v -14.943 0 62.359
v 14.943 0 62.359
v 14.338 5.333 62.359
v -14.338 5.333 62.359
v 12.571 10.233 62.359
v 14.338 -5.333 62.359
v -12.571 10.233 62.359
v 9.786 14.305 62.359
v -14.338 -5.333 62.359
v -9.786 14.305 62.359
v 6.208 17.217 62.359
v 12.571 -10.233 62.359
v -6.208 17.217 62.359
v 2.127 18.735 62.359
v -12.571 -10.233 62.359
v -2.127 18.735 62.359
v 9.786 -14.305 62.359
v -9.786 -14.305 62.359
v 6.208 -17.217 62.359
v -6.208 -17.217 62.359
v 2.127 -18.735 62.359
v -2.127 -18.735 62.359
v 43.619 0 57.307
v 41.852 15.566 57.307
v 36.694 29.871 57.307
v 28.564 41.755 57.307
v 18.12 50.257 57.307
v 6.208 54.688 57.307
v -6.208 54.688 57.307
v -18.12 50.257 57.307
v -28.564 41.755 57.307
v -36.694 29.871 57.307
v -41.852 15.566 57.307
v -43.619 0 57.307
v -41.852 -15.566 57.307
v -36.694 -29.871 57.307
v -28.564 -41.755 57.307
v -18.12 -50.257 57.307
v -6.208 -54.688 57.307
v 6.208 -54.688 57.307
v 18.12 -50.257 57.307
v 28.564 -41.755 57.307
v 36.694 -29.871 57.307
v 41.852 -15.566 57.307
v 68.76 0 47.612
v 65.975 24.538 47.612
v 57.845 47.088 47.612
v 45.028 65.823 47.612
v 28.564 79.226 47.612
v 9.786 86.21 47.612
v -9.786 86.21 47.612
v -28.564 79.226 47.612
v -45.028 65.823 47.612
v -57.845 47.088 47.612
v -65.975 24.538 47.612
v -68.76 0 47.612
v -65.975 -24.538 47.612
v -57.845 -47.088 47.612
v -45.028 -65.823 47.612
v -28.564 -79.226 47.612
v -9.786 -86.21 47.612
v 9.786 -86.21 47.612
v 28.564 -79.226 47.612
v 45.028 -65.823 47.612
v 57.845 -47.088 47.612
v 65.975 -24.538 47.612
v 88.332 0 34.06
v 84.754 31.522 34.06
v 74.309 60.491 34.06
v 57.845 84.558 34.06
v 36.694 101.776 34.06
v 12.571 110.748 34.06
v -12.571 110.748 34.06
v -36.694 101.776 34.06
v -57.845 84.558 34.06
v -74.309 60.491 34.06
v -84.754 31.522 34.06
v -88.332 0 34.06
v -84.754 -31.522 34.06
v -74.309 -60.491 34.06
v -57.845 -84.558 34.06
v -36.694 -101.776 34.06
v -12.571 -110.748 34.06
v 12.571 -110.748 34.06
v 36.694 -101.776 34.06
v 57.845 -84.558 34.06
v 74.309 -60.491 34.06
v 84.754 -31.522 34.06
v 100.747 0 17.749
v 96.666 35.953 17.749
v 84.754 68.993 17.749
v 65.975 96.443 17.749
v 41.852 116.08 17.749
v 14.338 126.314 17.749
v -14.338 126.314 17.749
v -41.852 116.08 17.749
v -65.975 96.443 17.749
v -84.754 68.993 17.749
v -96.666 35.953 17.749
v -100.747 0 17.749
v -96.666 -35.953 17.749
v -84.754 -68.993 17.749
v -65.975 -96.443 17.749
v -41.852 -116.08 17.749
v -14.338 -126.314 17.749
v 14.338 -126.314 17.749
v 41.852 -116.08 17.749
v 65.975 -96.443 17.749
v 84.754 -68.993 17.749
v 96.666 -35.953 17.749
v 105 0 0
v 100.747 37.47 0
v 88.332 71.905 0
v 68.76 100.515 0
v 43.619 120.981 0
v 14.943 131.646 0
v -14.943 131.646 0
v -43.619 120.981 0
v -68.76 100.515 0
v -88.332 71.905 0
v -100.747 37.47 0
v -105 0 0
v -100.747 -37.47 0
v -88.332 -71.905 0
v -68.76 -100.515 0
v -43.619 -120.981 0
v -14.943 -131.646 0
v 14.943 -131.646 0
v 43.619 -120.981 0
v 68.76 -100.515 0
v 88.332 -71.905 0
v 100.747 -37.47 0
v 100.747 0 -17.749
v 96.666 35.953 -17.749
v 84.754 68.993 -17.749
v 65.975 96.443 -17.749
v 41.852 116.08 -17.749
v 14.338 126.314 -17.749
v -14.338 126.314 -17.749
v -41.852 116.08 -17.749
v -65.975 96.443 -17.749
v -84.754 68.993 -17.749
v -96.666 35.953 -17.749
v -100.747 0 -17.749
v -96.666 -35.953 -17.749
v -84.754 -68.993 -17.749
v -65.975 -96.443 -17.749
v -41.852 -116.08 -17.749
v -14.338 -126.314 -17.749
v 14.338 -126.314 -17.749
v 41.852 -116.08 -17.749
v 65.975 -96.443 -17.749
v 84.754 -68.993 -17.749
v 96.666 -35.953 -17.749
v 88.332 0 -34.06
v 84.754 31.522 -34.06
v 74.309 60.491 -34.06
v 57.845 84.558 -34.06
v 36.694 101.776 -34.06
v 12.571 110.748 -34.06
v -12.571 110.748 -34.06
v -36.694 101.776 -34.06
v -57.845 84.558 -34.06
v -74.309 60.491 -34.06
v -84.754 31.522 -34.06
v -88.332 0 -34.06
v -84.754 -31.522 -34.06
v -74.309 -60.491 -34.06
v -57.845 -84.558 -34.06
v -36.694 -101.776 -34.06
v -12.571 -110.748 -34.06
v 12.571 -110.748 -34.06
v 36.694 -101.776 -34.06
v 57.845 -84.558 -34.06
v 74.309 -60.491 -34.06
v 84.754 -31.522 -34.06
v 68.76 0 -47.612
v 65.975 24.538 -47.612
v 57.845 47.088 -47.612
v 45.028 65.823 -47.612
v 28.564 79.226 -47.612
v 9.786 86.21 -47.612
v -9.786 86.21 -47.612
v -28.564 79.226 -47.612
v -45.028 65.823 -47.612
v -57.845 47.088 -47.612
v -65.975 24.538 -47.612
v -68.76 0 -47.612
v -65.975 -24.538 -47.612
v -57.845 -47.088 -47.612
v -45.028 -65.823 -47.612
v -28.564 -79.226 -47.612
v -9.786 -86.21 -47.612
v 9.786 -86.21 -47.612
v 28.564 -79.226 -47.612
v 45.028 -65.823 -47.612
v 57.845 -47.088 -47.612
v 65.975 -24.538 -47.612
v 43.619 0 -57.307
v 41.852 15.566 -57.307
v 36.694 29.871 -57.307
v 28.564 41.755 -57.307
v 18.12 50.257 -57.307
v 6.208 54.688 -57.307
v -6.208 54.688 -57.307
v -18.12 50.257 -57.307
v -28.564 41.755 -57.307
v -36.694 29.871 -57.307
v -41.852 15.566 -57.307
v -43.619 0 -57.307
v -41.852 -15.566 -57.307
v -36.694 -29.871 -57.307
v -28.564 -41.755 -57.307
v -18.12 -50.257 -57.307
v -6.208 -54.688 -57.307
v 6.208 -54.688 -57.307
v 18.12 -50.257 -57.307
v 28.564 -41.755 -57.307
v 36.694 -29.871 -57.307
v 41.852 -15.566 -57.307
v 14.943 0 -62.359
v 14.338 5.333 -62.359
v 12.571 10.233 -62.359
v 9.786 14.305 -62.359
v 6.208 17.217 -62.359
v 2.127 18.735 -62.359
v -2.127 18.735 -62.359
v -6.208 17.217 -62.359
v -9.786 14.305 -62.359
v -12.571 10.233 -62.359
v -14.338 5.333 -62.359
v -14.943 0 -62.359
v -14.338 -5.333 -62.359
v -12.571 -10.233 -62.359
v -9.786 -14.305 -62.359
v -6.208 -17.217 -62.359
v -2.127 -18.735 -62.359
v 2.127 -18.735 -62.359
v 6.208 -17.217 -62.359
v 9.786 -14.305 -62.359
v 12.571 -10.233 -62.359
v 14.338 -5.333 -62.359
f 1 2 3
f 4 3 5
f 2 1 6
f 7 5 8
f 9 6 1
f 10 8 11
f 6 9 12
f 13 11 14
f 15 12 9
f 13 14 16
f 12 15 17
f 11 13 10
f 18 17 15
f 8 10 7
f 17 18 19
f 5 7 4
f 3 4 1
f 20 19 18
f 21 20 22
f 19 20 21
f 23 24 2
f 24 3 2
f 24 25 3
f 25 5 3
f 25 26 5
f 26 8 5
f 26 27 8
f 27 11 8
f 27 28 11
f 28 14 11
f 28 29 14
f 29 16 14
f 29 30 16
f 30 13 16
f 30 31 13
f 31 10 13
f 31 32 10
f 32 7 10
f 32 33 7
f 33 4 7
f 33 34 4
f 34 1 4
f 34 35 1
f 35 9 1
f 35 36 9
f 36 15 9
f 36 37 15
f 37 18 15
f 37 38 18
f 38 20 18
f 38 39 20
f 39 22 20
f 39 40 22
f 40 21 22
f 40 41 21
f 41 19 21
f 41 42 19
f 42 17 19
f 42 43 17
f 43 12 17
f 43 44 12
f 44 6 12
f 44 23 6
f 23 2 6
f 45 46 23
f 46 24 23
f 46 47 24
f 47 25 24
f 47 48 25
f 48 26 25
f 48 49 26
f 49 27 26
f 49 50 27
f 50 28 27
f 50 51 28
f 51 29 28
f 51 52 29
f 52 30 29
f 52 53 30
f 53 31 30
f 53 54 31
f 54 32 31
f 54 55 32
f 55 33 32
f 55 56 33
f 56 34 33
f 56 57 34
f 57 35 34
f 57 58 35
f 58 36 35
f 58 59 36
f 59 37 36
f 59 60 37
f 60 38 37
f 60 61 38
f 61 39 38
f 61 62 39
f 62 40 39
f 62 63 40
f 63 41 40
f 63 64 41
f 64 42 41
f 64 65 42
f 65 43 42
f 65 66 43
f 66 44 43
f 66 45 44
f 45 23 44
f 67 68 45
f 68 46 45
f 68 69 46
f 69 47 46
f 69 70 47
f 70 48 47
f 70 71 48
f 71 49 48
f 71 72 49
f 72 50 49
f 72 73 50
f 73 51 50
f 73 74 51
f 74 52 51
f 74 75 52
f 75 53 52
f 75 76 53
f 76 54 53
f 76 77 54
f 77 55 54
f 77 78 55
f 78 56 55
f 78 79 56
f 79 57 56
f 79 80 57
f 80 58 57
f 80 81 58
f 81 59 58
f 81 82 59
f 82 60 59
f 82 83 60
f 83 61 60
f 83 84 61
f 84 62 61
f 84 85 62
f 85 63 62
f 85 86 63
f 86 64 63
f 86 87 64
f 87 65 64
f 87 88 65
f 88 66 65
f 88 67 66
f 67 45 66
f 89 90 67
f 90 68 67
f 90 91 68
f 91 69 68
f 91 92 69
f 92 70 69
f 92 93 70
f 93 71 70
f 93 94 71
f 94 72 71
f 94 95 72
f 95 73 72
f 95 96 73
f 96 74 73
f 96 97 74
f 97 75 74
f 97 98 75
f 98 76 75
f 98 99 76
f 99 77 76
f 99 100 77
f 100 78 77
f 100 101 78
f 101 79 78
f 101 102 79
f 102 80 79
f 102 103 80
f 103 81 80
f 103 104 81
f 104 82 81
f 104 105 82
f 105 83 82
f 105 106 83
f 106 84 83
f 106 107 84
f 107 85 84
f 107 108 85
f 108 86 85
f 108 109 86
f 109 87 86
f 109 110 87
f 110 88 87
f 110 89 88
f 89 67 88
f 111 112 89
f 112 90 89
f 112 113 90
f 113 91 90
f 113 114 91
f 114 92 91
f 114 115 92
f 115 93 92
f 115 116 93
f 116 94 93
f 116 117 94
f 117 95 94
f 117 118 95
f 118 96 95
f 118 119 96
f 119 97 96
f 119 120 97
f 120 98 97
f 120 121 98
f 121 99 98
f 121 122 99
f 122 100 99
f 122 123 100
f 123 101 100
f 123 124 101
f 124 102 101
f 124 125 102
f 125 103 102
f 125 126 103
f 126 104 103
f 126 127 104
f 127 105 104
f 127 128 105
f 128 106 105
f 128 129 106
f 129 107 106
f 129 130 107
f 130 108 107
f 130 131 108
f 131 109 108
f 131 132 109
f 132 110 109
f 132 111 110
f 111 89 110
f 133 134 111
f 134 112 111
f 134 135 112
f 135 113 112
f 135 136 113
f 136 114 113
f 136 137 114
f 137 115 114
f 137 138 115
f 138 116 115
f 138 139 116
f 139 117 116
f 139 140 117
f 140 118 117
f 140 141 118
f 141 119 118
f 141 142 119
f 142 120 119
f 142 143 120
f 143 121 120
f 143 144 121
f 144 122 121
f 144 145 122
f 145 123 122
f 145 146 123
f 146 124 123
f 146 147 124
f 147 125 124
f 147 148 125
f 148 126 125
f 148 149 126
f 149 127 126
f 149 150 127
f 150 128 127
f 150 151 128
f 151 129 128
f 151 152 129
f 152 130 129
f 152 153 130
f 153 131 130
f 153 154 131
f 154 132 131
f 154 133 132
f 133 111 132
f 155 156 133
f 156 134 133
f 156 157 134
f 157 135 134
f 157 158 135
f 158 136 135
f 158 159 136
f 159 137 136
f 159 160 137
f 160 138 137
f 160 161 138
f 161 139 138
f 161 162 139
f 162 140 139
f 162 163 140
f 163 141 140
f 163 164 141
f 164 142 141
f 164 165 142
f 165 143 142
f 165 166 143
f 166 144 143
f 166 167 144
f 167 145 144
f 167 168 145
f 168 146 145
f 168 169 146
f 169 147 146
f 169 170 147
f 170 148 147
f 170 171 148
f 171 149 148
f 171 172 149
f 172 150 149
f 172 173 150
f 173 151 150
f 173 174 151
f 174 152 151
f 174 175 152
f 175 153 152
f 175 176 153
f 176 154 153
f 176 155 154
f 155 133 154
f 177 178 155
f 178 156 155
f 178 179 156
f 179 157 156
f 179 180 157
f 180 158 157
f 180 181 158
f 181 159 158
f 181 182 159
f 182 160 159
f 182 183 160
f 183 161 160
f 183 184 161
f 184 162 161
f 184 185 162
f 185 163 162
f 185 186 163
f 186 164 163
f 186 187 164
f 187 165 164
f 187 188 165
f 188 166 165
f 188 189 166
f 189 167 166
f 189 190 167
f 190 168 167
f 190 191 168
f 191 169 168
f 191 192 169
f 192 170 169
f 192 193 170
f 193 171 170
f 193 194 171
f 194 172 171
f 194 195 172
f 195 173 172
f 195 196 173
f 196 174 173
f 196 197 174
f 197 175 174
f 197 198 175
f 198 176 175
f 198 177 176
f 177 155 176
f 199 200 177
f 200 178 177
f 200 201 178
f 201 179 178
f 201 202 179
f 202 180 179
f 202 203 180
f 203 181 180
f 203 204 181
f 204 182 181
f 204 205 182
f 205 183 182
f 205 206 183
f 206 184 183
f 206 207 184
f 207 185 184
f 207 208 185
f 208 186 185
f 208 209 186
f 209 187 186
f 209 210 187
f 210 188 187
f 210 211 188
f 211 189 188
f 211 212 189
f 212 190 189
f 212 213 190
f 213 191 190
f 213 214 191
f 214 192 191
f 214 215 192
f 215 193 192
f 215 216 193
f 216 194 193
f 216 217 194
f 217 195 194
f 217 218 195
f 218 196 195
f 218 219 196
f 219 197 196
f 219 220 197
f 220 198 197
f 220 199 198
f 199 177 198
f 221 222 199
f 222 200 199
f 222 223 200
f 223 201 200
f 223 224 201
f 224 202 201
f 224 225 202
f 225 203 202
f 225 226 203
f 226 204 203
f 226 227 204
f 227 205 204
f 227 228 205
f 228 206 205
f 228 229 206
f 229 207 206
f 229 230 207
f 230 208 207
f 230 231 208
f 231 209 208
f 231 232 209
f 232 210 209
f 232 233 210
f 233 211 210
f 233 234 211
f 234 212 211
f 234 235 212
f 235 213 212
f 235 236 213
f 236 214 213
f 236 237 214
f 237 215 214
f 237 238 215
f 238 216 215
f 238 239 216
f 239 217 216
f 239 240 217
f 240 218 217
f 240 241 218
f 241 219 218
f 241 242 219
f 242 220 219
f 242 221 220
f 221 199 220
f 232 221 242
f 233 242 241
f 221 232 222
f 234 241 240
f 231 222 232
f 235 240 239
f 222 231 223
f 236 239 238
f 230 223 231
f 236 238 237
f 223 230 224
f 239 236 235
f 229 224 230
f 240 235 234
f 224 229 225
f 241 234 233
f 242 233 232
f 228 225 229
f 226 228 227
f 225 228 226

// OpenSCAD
// Generated by SolidPython 1.0.1 on 2020-07-29 00:46:52


scale(v = [15, 19, 9]) {
	sphere(r = 7);
}
/***********************************************
*********      SolidPython code:      **********
************************************************
 
# import packages: SolidPython
from solid import *
from solid.utils import *
from itertools import chain, combinations, permutations


class Resize:

    def __init__(self, scad_file):
        self.scad_file = scad_file
        #self.scad_file = import_scad(scad_file)
        # cone/cylinder param:
        self.r1 = 0
        self.r2 = 0
        self.h = 0
        # rectangular prism param:
        self.w = 0
        self.l = 0
        # ellipse param:
        self.r = 0

    # import OpenScad code (file name corresponds to shape)


    # classify shape + parameters
    def assign(self, param1, param2, param3):
        if self.scad_file == 'cone.scad':
            self.r1 = param1
            self.r2 = param2
            self.h = param3
        elif self.scad_file == 'cylinder.scad':
            self.r1 = param1
            self.r2 = param2
            self.h = param3
        elif self.scad_file == 'rectangularPrism.scad':
            self.h = param1
            self.l = param2
            self.w = param3
        else:
            self.r = param1
            self.h = param2

    # resize parameters
    def iterate(self):
        x = range(3, 20, 2)
        i = 1
        if self.scad_file == 'cone.scad':
            tempList = list(permutations(x, 2))
            for temp in tempList:
                param1 = temp[0]
                param2 = temp[1]
                filepath = 'produced_scad_files/' + 'cone' + str(param1) + '_' + str(param2) + '_' + '.scad'
                scad_render_to_file(cylinder(h=param1, r1=param2, r2=0), filepath)

        elif self.scad_file == 'cylinder.scad':
            tempList = list(permutations(x, 3))
            for temp in tempList:
                param1 = temp[0]
                param2 = temp[1]
                filepath = 'produced_scad_files/' + 'cylinder' + str(param1) + '_' + str(param2) + '_' + '.scad'
                scad_render_to_file(cylinder(h=param1, r1=param2, r2=param2), filepath)

        elif self.scad_file == 'rectangularPrism.scad':
            tempList = list(permutations(x, 3))
            for temp in tempList:
                param1 = temp[0]
                param2 = temp[1]
                param3 = temp[2]
                filepath = 'produced_scad_files/' + 'rectangularPrism' + str(param1) + '_' + str(param2) + '_' + str(
                    param3) + '.scad'
                scad_render_to_file(cube(size=(param1, param2, param3)), filepath)

        elif self.scad_file == 'ellipse.scad':
            tempList = list(permutations(x, 4))
            for temp in tempList:
                param1 = temp[0]
                param2 = temp[1]
                param3 = temp[2]
                param4 = temp[3]
                filepath = 'produced_scad_files/' + 'ellipse' + str(param1) + '_' + str(param2) + '_' + str(param3) + '_' + str(param4) + '.scad'
                scad_render_to_file(scale([param1, param2, param3])(sphere(r=param4)), filepath)

    def render_to_scadfile(self):
        scad_render_to_file(scad, 'example.scad') 
 
************************************************/
